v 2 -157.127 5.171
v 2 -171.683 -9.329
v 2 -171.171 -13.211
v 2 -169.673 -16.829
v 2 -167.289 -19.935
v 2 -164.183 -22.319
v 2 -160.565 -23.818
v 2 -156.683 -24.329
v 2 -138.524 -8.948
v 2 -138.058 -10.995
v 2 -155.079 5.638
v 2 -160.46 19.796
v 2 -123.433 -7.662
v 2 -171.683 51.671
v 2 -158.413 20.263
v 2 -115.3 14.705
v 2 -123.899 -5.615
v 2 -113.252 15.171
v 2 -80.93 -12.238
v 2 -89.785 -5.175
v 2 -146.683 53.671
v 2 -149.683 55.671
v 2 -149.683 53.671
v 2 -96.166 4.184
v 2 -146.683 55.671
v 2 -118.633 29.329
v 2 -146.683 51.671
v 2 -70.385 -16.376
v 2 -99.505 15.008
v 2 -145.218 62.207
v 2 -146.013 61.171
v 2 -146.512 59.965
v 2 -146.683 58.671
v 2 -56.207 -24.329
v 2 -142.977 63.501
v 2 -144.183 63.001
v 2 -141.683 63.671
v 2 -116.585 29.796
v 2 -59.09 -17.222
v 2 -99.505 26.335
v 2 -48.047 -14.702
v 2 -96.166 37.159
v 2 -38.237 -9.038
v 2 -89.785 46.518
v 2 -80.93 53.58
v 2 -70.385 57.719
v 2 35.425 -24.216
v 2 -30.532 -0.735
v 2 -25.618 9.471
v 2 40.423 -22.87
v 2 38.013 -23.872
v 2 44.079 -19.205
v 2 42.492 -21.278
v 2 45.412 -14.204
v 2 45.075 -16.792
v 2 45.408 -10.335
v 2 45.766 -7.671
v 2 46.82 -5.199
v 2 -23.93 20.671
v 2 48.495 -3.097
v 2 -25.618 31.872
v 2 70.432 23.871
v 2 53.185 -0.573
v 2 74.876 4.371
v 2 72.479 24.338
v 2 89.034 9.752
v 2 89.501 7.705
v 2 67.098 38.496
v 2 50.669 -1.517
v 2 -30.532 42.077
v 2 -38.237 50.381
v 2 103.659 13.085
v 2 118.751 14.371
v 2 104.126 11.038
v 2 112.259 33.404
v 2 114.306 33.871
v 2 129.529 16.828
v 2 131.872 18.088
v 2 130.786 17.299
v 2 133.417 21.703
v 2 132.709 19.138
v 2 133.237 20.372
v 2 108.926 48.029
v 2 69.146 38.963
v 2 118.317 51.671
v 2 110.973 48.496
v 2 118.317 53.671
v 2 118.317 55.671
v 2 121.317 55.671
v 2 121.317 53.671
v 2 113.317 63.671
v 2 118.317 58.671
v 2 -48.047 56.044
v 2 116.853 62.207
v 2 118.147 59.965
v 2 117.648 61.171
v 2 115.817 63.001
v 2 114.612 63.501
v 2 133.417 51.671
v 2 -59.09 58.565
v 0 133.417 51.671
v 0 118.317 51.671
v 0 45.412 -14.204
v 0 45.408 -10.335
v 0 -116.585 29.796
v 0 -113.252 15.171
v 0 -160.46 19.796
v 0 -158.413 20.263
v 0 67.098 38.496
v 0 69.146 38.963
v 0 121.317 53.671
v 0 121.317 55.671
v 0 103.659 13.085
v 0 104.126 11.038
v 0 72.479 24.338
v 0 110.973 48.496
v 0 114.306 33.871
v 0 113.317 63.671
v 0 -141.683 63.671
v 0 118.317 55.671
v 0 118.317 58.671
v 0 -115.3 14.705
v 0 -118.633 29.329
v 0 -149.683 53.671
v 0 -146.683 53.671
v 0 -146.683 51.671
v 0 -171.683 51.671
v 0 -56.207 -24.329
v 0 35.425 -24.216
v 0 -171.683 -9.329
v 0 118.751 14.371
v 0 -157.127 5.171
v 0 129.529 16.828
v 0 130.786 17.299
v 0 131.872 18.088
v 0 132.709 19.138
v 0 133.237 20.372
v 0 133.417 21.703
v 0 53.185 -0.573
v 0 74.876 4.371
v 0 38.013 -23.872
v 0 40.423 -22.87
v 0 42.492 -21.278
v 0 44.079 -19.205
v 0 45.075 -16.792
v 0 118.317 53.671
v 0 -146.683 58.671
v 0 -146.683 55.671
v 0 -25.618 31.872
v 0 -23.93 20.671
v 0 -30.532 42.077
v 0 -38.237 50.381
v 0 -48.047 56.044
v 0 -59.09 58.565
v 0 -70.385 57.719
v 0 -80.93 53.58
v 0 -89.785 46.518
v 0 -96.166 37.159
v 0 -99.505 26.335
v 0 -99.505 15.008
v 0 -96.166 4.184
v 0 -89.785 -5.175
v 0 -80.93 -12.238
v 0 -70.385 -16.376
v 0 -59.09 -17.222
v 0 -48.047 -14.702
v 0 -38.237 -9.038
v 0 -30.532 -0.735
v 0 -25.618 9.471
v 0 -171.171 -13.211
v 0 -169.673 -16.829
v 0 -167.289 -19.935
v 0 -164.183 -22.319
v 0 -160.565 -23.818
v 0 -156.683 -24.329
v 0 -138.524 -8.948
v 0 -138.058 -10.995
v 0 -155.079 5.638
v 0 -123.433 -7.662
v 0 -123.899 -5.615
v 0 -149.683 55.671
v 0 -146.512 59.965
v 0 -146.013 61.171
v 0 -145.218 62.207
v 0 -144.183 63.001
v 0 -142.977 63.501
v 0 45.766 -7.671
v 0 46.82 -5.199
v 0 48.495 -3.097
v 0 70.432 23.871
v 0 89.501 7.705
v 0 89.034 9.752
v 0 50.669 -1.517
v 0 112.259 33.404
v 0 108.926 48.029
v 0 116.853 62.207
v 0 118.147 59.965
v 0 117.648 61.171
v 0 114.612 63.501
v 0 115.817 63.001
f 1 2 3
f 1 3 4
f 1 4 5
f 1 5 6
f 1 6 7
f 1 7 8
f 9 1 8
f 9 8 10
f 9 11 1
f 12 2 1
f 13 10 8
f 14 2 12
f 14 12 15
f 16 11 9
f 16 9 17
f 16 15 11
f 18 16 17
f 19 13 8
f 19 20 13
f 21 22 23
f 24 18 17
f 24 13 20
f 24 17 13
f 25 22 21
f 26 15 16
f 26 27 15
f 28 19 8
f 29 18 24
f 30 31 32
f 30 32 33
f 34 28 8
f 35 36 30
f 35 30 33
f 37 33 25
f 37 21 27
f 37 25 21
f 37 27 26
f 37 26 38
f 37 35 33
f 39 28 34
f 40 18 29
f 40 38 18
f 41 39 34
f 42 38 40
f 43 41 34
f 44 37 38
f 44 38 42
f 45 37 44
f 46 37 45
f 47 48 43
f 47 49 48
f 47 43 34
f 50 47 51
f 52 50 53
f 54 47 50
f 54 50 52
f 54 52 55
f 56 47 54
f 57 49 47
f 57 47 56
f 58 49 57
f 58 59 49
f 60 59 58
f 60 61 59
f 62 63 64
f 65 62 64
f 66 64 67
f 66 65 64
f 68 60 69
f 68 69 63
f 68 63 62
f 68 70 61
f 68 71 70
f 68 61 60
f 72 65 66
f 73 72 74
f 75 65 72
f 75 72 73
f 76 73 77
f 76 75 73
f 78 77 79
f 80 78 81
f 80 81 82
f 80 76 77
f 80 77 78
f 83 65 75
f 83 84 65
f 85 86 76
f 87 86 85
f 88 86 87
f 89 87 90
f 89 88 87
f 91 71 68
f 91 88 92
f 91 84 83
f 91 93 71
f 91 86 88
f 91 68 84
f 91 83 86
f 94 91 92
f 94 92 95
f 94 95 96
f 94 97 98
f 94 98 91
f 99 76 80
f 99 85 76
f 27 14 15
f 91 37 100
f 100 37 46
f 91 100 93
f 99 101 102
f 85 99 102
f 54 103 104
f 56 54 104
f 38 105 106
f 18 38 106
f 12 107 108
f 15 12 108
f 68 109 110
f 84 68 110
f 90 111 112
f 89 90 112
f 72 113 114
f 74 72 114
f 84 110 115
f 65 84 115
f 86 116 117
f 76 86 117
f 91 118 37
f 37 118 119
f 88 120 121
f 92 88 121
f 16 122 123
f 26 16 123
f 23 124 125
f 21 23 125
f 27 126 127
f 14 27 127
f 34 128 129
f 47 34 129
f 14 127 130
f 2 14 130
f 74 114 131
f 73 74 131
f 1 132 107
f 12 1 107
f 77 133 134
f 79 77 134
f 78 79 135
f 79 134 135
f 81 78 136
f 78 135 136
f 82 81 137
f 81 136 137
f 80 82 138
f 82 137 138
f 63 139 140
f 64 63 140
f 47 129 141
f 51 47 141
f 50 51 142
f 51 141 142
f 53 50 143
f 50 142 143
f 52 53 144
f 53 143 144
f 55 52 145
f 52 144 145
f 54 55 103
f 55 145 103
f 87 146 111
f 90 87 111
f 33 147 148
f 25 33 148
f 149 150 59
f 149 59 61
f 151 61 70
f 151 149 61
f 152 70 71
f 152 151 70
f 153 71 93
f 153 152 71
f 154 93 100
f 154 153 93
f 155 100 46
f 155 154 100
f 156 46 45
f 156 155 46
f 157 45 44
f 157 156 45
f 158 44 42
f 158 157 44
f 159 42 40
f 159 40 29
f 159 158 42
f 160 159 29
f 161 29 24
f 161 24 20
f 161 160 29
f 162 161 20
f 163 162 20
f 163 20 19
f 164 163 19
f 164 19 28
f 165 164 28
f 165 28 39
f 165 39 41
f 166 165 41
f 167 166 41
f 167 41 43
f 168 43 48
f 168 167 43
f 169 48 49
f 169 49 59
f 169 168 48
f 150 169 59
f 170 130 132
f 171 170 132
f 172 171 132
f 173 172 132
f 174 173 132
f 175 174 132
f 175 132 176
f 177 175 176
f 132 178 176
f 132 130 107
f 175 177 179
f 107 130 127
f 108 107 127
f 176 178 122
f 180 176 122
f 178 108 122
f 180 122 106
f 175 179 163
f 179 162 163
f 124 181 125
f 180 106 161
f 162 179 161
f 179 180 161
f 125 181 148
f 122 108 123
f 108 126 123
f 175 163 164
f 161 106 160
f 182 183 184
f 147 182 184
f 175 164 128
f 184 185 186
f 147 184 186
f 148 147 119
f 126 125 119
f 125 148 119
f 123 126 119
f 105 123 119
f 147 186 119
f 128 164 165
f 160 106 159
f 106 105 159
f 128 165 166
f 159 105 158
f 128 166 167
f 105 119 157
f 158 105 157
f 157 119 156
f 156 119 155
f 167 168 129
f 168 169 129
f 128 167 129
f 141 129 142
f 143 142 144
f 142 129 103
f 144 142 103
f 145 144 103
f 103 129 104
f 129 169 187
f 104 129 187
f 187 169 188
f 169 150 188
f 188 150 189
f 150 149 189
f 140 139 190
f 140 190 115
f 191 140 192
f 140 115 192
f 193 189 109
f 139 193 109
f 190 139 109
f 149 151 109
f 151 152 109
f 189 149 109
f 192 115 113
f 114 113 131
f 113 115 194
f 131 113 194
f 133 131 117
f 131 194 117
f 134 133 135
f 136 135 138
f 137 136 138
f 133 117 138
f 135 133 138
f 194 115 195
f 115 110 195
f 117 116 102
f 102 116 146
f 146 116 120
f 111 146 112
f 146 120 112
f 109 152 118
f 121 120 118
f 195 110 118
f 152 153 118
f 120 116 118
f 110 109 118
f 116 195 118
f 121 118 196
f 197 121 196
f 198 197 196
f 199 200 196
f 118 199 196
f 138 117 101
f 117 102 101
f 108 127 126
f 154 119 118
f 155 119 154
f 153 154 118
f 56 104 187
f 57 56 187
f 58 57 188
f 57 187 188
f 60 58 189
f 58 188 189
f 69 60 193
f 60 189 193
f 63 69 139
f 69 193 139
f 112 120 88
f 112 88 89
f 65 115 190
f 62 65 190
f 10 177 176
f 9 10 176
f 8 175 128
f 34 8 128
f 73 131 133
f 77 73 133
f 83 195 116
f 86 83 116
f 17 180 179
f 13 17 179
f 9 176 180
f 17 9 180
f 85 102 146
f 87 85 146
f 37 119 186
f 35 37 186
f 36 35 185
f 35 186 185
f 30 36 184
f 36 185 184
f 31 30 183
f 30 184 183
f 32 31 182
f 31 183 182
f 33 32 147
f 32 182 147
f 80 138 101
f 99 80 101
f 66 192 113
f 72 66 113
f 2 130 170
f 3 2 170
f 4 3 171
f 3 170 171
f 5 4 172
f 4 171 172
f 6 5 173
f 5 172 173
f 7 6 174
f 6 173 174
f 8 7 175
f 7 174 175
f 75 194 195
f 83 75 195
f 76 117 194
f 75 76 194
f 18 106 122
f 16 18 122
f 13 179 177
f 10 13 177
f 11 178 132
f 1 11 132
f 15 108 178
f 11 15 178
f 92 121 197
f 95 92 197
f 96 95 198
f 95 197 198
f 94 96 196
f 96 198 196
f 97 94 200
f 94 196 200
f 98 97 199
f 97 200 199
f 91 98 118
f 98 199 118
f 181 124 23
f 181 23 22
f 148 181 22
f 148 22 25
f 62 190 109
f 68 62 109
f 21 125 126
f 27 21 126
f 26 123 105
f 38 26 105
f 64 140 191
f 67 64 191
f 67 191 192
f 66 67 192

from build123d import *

# Parameters (mm, degrees)
F0_R     = 38
F0_W     = 3
F0_H     = 2
F1_DEPTH = 2


with BuildPart() as f1:
    # F0 (on Right) → F1 (new body)
    with BuildSketch(Plane.YZ):
        with BuildLine():
            Line((-146.682539, 58.671261), (-146.682539, 55.671261))
            Line((-146.682539, 55.671261), (-146.682539, 53.671261))
            Line((-146.682539, 53.671261), (-146.682539, 51.671261))
            Line((-146.682539, 51.671261), (-171.682539, 51.671261))
            Line((-171.682539, 51.671261), (-171.682539, -9.328739))
            ThreePointArc((-171.682539, -9.328739), (-167.289141, -19.935341), (-156.682539, -24.328739))
            Line((-156.682539, -24.328739), (-56.206871, -24.328739))
            Line((-56.206871, -24.328739), (35.424741, -24.216021))
            ThreePointArc((35.424741, -24.216021), (42.4922, -21.278392), (45.412432, -14.203727))
            Line((45.412432, -14.203727), (45.407673, -10.334779))
            ThreePointArc((45.407673, -10.334779), (47.586471, -4.091191), (53.185443, -0.572517))
            Line((53.185443, -0.572517), (74.875972, 4.371213))
            Line((74.875972, 4.371213), (89.500913, 7.704547))
            Line((89.500913, 7.704547), (89.034246, 9.752038))
            Line((89.034246, 9.752038), (103.659187, 13.085372))
            Line((103.659187, 13.085372), (104.125853, 11.03788))
            Line((104.125853, 11.03788), (118.750794, 14.371213))
            Line((118.750794, 14.371213), (129.528572, 16.827697))
            ThreePointArc((129.528572, 16.827697), (132.32614, 18.584629), (133.417461, 21.702677))
            Line((133.417461, 21.702677), (133.417461, 51.671261))
            Line((133.417461, 51.671261), (118.317461, 51.671261))
            Line((118.317461, 51.671261), (118.317461, 53.671261))
            Line((118.317461, 53.671261), (118.317461, 55.671261))
            Line((118.317461, 55.671261), (118.317461, 58.671261))
            ThreePointArc((118.317461, 58.671261), (116.852995, 62.206795), (113.317461, 63.671261))
            Line((113.317461, 63.671261), (-141.682539, 63.671261))
            ThreePointArc((-141.682539, 63.671261), (-145.218073, 62.206795), (-146.682539, 58.671261))
        make_face()
        Polygon((-123.432658, -7.662072), (-138.057599, -10.995406), (-138.524265, -8.947914), (-123.899325, -5.614581), align=None, mode=Mode.SUBTRACT)
        Polygon((-155.079492, 5.637848), (-157.126984, 5.171182), (-160.460317, 19.796122), (-158.412825, 20.262789), align=None, mode=Mode.SUBTRACT)
        Polygon((-116.585495, 29.796122), (-113.252162, 15.171182), (-115.299654, 14.704515), (-118.632987, 29.329456), align=None, mode=Mode.SUBTRACT)
        with Locations((-61.929516, 20.671261)):
            Circle(F0_R, mode=Mode.SUBTRACT)
        Polygon((72.479019, 24.337801), (70.431528, 23.871134), (67.098194, 38.496075), (69.145686, 38.962742), align=None, mode=Mode.SUBTRACT)
        Polygon((110.973016, 48.496075), (114.30635, 33.871134), (112.258858, 33.404468), (108.925524, 48.029408), align=None, mode=Mode.SUBTRACT)
        with Locations((119.817461, 54.671261)):
            Rectangle(F0_W, F0_H)
        with Locations((-148.182539, 54.671261)):
            Rectangle(F0_W, F0_H)
    extrude(amount=F1_DEPTH)


solid = f1.part
